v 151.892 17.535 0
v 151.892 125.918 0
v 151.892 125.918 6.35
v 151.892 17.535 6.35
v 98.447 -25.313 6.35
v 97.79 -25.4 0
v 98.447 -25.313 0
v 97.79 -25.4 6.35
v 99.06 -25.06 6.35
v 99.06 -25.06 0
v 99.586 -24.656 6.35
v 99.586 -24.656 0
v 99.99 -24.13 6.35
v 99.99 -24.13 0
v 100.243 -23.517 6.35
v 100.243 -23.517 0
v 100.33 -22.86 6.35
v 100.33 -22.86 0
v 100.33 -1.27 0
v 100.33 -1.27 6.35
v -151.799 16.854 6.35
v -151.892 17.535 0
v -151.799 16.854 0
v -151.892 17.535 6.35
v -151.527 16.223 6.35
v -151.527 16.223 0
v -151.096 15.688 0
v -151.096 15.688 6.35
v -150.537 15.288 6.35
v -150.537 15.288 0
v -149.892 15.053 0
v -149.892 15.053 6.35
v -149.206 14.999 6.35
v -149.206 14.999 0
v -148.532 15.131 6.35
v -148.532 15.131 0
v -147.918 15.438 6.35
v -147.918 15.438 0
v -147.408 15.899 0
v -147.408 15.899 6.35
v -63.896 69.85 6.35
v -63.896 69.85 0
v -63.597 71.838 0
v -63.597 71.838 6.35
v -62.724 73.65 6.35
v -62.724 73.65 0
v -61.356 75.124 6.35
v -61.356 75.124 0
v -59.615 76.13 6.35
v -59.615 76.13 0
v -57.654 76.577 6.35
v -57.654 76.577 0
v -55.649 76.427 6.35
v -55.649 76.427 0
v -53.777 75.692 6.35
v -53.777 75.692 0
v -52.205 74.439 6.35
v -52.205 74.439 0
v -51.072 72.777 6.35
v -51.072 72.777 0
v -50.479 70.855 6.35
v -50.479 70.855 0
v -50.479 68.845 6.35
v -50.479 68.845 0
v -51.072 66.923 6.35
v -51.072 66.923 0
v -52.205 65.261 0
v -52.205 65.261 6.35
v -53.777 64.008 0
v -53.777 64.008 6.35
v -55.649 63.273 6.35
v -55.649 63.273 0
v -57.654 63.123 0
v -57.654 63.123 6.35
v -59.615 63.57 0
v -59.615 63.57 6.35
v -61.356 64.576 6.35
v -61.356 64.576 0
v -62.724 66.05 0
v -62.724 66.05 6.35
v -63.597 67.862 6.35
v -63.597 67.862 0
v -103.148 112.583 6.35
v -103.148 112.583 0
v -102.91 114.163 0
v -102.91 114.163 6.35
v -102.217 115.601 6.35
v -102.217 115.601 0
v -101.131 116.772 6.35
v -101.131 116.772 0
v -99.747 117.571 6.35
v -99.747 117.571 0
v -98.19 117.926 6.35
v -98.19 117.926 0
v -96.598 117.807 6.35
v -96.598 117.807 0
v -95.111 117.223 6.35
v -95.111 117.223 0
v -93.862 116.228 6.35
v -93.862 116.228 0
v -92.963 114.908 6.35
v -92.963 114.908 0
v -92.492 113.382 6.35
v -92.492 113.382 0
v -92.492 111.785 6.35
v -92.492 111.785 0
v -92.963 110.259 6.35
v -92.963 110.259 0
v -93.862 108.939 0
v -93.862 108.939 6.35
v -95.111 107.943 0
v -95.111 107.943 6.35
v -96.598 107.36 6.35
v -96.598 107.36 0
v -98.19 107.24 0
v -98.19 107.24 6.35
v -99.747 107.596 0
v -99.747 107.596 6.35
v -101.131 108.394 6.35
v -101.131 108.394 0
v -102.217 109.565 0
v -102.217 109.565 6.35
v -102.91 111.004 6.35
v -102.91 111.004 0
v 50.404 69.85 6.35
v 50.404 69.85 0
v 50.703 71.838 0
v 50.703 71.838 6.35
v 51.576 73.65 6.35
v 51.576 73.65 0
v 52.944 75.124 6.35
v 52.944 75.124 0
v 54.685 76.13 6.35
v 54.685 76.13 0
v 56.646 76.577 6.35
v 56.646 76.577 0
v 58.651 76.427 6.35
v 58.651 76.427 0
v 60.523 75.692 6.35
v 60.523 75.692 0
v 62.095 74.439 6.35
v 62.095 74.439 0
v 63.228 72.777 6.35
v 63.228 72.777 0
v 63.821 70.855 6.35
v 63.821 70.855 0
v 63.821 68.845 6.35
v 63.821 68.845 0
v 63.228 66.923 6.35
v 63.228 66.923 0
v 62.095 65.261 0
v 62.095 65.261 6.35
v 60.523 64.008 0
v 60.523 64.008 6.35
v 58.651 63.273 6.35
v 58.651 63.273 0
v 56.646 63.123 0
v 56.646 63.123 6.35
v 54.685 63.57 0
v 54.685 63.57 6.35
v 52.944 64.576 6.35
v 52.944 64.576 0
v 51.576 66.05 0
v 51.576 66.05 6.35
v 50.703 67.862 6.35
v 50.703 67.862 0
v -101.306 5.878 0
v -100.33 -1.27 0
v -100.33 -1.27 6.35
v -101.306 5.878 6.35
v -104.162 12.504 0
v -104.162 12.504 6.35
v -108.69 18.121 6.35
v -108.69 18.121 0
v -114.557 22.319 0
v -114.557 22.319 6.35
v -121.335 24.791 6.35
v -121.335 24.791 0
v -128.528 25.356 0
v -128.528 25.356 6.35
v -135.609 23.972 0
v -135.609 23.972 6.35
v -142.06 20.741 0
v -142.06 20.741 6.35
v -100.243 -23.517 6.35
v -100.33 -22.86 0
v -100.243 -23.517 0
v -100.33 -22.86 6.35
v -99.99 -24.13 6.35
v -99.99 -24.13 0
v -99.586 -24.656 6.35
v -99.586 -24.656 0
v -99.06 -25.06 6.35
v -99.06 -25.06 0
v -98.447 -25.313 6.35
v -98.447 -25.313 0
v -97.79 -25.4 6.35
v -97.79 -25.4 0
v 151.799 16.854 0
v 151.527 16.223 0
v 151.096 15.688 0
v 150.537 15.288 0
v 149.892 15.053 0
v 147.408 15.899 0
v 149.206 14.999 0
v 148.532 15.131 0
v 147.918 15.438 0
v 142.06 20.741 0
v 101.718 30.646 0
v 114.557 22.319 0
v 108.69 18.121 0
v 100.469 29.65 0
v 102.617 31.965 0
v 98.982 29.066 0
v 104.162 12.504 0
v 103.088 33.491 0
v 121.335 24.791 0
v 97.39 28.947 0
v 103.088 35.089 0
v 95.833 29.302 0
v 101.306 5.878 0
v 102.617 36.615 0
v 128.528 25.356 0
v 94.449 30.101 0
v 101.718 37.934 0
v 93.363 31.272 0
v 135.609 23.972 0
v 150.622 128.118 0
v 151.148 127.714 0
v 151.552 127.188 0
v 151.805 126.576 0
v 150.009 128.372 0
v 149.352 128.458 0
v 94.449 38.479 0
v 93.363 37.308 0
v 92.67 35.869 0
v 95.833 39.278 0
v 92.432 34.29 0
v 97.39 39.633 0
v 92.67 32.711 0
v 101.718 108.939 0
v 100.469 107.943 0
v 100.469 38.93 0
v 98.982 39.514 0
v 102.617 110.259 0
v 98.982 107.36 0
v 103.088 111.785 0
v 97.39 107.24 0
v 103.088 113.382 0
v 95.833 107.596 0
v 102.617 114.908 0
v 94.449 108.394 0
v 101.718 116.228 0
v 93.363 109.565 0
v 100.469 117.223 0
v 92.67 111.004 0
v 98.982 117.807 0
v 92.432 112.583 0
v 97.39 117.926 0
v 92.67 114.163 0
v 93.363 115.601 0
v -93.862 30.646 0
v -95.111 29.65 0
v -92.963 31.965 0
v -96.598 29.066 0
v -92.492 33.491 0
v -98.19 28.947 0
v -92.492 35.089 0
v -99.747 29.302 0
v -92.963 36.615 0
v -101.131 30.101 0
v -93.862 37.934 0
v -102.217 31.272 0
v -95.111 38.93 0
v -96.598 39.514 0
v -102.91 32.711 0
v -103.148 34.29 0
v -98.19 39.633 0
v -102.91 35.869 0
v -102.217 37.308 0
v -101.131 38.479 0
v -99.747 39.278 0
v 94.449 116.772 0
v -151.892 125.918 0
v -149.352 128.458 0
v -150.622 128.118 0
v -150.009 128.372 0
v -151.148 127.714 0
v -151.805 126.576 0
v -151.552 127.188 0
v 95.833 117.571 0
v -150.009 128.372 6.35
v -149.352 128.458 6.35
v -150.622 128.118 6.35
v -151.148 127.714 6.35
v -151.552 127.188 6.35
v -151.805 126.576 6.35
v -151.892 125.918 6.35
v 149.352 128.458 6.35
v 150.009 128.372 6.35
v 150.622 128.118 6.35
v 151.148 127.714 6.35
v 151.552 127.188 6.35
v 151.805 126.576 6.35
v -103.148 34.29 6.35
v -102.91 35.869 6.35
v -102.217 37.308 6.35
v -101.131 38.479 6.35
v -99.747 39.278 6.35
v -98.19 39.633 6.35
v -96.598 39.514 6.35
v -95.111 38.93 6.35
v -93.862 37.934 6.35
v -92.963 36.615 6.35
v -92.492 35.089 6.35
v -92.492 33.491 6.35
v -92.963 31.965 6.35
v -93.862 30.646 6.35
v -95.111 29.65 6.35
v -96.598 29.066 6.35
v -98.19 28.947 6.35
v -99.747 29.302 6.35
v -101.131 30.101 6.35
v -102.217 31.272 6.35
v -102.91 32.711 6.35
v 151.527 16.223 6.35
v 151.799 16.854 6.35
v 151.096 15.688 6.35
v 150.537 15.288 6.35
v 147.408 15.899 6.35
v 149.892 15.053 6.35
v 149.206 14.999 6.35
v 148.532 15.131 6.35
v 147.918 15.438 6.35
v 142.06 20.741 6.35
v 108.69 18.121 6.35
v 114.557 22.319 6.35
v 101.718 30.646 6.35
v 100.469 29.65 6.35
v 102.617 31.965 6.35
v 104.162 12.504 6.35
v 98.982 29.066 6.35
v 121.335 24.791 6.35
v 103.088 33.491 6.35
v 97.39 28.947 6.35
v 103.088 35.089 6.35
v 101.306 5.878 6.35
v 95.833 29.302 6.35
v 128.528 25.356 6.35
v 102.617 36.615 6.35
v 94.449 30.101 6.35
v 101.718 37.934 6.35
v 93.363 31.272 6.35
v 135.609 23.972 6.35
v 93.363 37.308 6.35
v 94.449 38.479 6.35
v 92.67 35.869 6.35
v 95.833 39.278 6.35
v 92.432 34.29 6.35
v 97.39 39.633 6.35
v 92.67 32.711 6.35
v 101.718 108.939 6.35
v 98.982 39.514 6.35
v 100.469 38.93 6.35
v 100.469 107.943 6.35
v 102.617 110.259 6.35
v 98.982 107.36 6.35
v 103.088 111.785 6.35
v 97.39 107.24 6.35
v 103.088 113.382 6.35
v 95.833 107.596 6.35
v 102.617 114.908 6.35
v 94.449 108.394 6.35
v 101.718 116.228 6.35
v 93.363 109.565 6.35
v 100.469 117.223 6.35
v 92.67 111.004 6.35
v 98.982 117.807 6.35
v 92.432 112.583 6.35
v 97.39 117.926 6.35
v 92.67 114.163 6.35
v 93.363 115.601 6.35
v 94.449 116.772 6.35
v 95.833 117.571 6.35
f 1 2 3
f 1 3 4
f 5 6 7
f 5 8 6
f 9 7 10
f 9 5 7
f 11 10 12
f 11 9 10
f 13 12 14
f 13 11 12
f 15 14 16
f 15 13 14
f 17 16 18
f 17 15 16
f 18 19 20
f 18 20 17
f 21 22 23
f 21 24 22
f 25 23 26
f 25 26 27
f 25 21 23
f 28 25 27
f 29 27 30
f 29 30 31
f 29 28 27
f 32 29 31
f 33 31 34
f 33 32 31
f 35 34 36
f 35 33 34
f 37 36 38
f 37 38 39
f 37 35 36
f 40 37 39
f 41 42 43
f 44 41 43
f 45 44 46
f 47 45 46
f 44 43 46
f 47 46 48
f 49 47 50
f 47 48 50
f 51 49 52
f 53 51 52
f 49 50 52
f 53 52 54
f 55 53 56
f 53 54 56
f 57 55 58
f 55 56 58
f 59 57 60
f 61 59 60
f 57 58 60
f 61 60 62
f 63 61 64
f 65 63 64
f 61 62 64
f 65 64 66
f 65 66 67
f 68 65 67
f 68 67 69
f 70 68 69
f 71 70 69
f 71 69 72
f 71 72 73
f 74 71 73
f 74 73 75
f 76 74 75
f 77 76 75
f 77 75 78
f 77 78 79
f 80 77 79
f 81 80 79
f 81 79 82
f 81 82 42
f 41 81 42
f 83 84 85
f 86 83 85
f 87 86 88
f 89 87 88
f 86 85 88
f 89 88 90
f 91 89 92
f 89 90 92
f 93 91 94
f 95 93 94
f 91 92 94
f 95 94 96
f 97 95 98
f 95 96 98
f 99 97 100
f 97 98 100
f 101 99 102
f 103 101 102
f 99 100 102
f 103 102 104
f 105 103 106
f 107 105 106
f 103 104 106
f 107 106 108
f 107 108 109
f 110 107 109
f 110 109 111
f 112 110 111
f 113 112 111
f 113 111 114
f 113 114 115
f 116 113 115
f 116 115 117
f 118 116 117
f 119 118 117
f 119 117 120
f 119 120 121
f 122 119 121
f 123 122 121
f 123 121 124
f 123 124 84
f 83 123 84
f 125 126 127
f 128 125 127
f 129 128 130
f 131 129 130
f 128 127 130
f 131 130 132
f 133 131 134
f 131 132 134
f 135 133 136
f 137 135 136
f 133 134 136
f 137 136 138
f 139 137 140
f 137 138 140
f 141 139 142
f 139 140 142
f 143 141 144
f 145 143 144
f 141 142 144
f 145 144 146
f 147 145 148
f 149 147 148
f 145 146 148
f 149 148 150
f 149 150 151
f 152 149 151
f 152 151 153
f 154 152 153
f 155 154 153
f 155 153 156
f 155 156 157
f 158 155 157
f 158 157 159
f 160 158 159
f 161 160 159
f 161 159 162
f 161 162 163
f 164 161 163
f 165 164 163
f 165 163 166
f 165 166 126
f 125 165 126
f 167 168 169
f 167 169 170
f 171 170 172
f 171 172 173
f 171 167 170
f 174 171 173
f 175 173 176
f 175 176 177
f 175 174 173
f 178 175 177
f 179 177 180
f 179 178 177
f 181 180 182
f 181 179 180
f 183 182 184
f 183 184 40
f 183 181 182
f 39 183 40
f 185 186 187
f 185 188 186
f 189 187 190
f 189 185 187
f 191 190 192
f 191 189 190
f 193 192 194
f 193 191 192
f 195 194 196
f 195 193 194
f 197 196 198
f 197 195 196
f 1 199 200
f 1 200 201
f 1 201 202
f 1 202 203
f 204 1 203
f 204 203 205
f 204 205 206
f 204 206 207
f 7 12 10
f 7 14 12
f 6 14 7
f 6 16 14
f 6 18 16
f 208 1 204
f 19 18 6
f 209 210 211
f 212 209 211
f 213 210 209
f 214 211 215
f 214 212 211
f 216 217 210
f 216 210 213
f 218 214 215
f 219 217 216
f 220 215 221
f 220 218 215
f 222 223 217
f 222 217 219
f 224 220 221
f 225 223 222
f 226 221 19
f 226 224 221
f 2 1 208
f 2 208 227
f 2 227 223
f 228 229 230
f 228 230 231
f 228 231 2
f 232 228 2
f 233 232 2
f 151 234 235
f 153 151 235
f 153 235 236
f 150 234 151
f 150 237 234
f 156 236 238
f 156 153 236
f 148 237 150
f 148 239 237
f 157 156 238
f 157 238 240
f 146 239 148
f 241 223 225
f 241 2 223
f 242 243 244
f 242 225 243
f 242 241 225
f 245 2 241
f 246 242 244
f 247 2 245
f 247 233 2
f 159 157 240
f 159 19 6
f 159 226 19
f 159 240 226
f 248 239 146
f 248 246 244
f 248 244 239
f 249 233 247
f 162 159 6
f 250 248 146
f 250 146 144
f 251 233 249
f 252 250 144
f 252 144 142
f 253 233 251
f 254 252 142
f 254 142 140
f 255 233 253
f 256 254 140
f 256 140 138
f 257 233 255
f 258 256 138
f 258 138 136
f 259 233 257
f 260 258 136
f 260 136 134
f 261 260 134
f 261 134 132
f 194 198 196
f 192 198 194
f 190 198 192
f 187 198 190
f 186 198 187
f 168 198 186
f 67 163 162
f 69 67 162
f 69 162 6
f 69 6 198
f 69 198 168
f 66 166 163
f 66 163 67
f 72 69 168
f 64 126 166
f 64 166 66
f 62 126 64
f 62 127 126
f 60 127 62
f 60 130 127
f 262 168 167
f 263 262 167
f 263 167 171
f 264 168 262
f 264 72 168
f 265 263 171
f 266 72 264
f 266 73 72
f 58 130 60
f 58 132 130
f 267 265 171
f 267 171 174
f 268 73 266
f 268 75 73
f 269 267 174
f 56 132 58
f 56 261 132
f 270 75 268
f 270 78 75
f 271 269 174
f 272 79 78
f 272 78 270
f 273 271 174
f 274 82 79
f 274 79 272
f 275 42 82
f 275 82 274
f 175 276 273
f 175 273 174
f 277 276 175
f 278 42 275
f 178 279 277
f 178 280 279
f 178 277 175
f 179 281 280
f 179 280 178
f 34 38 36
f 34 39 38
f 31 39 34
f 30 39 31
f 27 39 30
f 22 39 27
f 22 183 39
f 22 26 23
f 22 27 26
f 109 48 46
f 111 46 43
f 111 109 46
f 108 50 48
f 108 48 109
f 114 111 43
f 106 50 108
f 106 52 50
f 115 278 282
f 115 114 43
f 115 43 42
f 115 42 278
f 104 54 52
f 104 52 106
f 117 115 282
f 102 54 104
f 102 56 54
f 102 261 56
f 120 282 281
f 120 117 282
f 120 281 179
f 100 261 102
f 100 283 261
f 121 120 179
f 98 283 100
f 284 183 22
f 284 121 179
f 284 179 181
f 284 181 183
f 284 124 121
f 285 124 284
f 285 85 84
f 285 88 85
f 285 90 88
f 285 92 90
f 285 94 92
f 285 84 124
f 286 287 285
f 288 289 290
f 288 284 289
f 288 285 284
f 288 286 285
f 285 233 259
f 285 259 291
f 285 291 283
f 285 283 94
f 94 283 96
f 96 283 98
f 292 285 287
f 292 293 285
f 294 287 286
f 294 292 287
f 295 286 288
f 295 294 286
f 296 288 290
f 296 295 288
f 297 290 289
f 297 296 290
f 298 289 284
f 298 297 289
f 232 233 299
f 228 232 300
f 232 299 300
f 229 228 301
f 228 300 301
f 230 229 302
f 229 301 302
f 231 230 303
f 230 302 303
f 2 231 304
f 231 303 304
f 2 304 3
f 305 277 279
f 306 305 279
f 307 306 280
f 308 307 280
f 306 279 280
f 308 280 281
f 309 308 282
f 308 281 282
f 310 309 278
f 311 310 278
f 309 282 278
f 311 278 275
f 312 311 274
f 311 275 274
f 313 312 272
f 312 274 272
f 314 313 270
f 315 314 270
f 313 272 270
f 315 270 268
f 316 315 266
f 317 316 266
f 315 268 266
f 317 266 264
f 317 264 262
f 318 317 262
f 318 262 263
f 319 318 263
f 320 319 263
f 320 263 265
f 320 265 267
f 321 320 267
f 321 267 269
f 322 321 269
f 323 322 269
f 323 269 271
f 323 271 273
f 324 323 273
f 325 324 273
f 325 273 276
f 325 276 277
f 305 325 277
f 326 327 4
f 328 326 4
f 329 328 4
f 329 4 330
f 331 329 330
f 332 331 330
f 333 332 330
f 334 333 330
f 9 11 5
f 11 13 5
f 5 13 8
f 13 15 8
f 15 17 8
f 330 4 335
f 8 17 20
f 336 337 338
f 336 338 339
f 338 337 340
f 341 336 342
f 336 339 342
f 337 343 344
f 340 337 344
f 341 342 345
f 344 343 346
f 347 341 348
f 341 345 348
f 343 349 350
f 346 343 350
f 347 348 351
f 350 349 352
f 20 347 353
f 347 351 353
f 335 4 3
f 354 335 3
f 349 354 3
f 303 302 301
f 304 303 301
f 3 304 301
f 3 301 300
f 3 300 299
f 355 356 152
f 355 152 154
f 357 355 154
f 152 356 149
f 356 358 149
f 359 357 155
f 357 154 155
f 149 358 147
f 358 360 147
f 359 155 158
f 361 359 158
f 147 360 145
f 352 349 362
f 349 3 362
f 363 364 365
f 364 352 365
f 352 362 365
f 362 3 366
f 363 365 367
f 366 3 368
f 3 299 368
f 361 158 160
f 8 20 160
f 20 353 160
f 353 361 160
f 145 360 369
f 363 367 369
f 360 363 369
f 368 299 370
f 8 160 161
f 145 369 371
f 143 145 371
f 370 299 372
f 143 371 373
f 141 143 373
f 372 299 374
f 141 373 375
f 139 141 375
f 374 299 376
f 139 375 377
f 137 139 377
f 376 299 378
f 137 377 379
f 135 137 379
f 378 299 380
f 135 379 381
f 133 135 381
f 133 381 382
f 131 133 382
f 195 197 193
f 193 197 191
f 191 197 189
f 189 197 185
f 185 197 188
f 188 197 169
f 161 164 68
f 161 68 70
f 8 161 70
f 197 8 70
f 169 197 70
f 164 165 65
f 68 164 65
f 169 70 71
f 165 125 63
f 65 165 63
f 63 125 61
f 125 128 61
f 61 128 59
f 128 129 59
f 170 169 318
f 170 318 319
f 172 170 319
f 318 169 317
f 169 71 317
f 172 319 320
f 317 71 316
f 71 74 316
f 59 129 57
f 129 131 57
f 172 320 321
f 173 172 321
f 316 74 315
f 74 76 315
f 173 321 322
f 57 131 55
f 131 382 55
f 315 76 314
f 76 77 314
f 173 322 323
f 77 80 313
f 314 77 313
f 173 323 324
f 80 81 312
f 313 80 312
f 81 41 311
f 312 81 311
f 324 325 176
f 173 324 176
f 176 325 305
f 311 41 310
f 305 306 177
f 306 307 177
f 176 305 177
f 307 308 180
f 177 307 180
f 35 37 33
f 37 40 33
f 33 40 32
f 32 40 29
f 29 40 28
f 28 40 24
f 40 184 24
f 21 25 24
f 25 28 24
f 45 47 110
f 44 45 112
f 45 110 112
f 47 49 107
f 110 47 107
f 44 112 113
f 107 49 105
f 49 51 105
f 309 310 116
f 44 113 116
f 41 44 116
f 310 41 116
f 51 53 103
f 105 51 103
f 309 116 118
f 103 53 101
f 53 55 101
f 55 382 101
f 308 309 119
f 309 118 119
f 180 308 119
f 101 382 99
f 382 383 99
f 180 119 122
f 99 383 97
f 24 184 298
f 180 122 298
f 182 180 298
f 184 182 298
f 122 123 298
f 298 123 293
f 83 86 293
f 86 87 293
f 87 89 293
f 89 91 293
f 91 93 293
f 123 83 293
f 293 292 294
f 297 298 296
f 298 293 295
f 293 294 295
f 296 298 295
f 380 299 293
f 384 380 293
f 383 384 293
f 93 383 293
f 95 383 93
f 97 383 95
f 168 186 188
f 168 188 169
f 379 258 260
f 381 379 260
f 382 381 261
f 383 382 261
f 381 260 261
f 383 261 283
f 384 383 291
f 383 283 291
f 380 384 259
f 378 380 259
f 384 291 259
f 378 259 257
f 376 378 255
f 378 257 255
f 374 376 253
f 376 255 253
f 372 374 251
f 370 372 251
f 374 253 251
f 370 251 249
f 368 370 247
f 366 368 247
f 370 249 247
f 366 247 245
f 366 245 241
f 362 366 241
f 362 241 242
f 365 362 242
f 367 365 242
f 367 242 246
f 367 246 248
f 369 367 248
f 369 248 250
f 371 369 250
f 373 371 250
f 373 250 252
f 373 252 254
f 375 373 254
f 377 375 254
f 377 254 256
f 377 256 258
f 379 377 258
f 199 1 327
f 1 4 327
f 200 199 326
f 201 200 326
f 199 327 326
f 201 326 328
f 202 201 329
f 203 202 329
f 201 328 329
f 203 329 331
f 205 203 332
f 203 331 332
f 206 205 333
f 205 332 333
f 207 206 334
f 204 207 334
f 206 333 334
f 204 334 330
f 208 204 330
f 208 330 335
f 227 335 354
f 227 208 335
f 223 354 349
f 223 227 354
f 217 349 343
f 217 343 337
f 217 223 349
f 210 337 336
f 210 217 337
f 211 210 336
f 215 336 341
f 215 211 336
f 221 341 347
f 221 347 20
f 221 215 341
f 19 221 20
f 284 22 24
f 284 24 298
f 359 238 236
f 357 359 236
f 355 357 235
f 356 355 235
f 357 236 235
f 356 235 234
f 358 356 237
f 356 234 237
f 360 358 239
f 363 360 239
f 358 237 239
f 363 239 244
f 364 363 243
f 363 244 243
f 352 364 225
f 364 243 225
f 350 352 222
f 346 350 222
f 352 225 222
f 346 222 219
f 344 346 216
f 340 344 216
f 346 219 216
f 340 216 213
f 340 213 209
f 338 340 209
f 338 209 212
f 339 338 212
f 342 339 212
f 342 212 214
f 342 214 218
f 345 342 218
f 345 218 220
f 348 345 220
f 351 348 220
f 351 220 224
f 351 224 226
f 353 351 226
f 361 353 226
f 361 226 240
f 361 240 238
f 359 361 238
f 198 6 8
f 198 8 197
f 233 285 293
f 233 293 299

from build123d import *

# Parameters (mm, degrees)
BOSS_EXTRUDE1_DEPTH              = 6.35
CUT_EXTRUDE1_DEPTH               = 221.472033966
F_27_64_0_42188_DIAMETER_HOLE1_D = 10.715752
FILLET1_R                        = 2.54
F_1_2_CLEARANCE_HOLE1_D          = 13.49248


with BuildPart() as part:
    # Sketch1 → Boss-Extrude1 (new body)
    with BuildSketch(Plane.XY):
        with BuildLine():
            Line((-179.07, -25.4), (-179.07, 128.45828257))
            Line((-179.07, 128.45828257), (179.07, 128.45828257))
            Line((179.07, 128.45828257), (179.07, -25.4))
            Line((179.07, -25.4), (153.67, -25.4))
            Line((153.67, -25.4), (153.67, -1.27))
            ThreePointArc((153.67, -1.27), (127, 25.4), (100.33, -1.27))
            Line((100.33, -1.27), (100.33, -25.4))
            Line((100.33, -25.4), (-100.33, -25.4))
            Line((-100.33, -25.4), (-100.33, -1.27))
            ThreePointArc((-100.33, -1.27), (-127, 25.4), (-153.67, -1.27))
            Line((-153.67, -1.27), (-153.67, -25.4))
            Line((-153.67, -25.4), (-179.07, -25.4))
        make_face()
    extrude(amount=BOSS_EXTRUDE1_DEPTH)

    # Sketch7 → Cut-Extrude1 (cut, through all)
    with BuildSketch(Plane(origin=(0, 0, 0), x_dir=(-1, 0, 0), z_dir=(0, 0, -1))):
        with BuildLine():
            Line((-151.892, 128.45828257), (-151.892, 8.304823027))
            ThreePointArc((-151.892, 8.304823027), (-153.22173278, 3.599253536), (-153.67, -1.27))
            Line((-153.67, -1.27), (-153.67, -25.4))
            Line((-153.67, -25.4), (-179.07, -25.4))
            Line((-179.07, -25.4), (-179.07, 128.45828257))
            Line((-179.07, 128.45828257), (-151.892, 128.45828257))
        make_face()
        with BuildLine():
            Line((153.67, -25.4), (153.67, -1.27))
            ThreePointArc((153.67, -1.27), (153.22173278, 3.599253536), (151.892, 8.304823027))
            Line((151.892, 8.304823027), (151.892, 128.45828257))
            Line((151.892, 128.45828257), (179.07, 128.45828257))
            Line((179.07, 128.45828257), (179.07, -25.4))
            Line((179.07, -25.4), (153.67, -25.4))
        make_face()
    extrude(amount=-CUT_EXTRUDE1_DEPTH, mode=Mode.SUBTRACT)

    # 27/64 (0.42188) Diameter Hole1 (through all)
    with Locations(Plane.XY.offset(6.35)):
        with Locations((-97.79, 34.29), (-97.79, 112.58328257), (97.79, 34.29), (97.79, 112.58328257)):
            Hole(F_27_64_0_42188_DIAMETER_HOLE1_D / 2)

    # Fillet1
    fillet1_edges = [part.edges().sort_by_distance(p)[0] for p in [
        (100.33, -25.4, 3.175),
        (-100.33, -25.4, 3.175),
        (151.892, 128.45828257, 3.175),
        (151.892, 8.304823027, 3.175),
        (-151.892, 8.304823027, 3.175),
        (-151.892, 128.45828257, 3.175),
    ]]
    fillet(fillet1_edges, radius=FILLET1_R)

    # 1/2 Clearance Hole1 (through all)
    with Locations(Plane.XY.offset(6.35)):
        with Locations((57.15, 69.85), (-57.15, 69.85)):
            Hole(F_1_2_CLEARANCE_HOLE1_D / 2)


solid = part.part
